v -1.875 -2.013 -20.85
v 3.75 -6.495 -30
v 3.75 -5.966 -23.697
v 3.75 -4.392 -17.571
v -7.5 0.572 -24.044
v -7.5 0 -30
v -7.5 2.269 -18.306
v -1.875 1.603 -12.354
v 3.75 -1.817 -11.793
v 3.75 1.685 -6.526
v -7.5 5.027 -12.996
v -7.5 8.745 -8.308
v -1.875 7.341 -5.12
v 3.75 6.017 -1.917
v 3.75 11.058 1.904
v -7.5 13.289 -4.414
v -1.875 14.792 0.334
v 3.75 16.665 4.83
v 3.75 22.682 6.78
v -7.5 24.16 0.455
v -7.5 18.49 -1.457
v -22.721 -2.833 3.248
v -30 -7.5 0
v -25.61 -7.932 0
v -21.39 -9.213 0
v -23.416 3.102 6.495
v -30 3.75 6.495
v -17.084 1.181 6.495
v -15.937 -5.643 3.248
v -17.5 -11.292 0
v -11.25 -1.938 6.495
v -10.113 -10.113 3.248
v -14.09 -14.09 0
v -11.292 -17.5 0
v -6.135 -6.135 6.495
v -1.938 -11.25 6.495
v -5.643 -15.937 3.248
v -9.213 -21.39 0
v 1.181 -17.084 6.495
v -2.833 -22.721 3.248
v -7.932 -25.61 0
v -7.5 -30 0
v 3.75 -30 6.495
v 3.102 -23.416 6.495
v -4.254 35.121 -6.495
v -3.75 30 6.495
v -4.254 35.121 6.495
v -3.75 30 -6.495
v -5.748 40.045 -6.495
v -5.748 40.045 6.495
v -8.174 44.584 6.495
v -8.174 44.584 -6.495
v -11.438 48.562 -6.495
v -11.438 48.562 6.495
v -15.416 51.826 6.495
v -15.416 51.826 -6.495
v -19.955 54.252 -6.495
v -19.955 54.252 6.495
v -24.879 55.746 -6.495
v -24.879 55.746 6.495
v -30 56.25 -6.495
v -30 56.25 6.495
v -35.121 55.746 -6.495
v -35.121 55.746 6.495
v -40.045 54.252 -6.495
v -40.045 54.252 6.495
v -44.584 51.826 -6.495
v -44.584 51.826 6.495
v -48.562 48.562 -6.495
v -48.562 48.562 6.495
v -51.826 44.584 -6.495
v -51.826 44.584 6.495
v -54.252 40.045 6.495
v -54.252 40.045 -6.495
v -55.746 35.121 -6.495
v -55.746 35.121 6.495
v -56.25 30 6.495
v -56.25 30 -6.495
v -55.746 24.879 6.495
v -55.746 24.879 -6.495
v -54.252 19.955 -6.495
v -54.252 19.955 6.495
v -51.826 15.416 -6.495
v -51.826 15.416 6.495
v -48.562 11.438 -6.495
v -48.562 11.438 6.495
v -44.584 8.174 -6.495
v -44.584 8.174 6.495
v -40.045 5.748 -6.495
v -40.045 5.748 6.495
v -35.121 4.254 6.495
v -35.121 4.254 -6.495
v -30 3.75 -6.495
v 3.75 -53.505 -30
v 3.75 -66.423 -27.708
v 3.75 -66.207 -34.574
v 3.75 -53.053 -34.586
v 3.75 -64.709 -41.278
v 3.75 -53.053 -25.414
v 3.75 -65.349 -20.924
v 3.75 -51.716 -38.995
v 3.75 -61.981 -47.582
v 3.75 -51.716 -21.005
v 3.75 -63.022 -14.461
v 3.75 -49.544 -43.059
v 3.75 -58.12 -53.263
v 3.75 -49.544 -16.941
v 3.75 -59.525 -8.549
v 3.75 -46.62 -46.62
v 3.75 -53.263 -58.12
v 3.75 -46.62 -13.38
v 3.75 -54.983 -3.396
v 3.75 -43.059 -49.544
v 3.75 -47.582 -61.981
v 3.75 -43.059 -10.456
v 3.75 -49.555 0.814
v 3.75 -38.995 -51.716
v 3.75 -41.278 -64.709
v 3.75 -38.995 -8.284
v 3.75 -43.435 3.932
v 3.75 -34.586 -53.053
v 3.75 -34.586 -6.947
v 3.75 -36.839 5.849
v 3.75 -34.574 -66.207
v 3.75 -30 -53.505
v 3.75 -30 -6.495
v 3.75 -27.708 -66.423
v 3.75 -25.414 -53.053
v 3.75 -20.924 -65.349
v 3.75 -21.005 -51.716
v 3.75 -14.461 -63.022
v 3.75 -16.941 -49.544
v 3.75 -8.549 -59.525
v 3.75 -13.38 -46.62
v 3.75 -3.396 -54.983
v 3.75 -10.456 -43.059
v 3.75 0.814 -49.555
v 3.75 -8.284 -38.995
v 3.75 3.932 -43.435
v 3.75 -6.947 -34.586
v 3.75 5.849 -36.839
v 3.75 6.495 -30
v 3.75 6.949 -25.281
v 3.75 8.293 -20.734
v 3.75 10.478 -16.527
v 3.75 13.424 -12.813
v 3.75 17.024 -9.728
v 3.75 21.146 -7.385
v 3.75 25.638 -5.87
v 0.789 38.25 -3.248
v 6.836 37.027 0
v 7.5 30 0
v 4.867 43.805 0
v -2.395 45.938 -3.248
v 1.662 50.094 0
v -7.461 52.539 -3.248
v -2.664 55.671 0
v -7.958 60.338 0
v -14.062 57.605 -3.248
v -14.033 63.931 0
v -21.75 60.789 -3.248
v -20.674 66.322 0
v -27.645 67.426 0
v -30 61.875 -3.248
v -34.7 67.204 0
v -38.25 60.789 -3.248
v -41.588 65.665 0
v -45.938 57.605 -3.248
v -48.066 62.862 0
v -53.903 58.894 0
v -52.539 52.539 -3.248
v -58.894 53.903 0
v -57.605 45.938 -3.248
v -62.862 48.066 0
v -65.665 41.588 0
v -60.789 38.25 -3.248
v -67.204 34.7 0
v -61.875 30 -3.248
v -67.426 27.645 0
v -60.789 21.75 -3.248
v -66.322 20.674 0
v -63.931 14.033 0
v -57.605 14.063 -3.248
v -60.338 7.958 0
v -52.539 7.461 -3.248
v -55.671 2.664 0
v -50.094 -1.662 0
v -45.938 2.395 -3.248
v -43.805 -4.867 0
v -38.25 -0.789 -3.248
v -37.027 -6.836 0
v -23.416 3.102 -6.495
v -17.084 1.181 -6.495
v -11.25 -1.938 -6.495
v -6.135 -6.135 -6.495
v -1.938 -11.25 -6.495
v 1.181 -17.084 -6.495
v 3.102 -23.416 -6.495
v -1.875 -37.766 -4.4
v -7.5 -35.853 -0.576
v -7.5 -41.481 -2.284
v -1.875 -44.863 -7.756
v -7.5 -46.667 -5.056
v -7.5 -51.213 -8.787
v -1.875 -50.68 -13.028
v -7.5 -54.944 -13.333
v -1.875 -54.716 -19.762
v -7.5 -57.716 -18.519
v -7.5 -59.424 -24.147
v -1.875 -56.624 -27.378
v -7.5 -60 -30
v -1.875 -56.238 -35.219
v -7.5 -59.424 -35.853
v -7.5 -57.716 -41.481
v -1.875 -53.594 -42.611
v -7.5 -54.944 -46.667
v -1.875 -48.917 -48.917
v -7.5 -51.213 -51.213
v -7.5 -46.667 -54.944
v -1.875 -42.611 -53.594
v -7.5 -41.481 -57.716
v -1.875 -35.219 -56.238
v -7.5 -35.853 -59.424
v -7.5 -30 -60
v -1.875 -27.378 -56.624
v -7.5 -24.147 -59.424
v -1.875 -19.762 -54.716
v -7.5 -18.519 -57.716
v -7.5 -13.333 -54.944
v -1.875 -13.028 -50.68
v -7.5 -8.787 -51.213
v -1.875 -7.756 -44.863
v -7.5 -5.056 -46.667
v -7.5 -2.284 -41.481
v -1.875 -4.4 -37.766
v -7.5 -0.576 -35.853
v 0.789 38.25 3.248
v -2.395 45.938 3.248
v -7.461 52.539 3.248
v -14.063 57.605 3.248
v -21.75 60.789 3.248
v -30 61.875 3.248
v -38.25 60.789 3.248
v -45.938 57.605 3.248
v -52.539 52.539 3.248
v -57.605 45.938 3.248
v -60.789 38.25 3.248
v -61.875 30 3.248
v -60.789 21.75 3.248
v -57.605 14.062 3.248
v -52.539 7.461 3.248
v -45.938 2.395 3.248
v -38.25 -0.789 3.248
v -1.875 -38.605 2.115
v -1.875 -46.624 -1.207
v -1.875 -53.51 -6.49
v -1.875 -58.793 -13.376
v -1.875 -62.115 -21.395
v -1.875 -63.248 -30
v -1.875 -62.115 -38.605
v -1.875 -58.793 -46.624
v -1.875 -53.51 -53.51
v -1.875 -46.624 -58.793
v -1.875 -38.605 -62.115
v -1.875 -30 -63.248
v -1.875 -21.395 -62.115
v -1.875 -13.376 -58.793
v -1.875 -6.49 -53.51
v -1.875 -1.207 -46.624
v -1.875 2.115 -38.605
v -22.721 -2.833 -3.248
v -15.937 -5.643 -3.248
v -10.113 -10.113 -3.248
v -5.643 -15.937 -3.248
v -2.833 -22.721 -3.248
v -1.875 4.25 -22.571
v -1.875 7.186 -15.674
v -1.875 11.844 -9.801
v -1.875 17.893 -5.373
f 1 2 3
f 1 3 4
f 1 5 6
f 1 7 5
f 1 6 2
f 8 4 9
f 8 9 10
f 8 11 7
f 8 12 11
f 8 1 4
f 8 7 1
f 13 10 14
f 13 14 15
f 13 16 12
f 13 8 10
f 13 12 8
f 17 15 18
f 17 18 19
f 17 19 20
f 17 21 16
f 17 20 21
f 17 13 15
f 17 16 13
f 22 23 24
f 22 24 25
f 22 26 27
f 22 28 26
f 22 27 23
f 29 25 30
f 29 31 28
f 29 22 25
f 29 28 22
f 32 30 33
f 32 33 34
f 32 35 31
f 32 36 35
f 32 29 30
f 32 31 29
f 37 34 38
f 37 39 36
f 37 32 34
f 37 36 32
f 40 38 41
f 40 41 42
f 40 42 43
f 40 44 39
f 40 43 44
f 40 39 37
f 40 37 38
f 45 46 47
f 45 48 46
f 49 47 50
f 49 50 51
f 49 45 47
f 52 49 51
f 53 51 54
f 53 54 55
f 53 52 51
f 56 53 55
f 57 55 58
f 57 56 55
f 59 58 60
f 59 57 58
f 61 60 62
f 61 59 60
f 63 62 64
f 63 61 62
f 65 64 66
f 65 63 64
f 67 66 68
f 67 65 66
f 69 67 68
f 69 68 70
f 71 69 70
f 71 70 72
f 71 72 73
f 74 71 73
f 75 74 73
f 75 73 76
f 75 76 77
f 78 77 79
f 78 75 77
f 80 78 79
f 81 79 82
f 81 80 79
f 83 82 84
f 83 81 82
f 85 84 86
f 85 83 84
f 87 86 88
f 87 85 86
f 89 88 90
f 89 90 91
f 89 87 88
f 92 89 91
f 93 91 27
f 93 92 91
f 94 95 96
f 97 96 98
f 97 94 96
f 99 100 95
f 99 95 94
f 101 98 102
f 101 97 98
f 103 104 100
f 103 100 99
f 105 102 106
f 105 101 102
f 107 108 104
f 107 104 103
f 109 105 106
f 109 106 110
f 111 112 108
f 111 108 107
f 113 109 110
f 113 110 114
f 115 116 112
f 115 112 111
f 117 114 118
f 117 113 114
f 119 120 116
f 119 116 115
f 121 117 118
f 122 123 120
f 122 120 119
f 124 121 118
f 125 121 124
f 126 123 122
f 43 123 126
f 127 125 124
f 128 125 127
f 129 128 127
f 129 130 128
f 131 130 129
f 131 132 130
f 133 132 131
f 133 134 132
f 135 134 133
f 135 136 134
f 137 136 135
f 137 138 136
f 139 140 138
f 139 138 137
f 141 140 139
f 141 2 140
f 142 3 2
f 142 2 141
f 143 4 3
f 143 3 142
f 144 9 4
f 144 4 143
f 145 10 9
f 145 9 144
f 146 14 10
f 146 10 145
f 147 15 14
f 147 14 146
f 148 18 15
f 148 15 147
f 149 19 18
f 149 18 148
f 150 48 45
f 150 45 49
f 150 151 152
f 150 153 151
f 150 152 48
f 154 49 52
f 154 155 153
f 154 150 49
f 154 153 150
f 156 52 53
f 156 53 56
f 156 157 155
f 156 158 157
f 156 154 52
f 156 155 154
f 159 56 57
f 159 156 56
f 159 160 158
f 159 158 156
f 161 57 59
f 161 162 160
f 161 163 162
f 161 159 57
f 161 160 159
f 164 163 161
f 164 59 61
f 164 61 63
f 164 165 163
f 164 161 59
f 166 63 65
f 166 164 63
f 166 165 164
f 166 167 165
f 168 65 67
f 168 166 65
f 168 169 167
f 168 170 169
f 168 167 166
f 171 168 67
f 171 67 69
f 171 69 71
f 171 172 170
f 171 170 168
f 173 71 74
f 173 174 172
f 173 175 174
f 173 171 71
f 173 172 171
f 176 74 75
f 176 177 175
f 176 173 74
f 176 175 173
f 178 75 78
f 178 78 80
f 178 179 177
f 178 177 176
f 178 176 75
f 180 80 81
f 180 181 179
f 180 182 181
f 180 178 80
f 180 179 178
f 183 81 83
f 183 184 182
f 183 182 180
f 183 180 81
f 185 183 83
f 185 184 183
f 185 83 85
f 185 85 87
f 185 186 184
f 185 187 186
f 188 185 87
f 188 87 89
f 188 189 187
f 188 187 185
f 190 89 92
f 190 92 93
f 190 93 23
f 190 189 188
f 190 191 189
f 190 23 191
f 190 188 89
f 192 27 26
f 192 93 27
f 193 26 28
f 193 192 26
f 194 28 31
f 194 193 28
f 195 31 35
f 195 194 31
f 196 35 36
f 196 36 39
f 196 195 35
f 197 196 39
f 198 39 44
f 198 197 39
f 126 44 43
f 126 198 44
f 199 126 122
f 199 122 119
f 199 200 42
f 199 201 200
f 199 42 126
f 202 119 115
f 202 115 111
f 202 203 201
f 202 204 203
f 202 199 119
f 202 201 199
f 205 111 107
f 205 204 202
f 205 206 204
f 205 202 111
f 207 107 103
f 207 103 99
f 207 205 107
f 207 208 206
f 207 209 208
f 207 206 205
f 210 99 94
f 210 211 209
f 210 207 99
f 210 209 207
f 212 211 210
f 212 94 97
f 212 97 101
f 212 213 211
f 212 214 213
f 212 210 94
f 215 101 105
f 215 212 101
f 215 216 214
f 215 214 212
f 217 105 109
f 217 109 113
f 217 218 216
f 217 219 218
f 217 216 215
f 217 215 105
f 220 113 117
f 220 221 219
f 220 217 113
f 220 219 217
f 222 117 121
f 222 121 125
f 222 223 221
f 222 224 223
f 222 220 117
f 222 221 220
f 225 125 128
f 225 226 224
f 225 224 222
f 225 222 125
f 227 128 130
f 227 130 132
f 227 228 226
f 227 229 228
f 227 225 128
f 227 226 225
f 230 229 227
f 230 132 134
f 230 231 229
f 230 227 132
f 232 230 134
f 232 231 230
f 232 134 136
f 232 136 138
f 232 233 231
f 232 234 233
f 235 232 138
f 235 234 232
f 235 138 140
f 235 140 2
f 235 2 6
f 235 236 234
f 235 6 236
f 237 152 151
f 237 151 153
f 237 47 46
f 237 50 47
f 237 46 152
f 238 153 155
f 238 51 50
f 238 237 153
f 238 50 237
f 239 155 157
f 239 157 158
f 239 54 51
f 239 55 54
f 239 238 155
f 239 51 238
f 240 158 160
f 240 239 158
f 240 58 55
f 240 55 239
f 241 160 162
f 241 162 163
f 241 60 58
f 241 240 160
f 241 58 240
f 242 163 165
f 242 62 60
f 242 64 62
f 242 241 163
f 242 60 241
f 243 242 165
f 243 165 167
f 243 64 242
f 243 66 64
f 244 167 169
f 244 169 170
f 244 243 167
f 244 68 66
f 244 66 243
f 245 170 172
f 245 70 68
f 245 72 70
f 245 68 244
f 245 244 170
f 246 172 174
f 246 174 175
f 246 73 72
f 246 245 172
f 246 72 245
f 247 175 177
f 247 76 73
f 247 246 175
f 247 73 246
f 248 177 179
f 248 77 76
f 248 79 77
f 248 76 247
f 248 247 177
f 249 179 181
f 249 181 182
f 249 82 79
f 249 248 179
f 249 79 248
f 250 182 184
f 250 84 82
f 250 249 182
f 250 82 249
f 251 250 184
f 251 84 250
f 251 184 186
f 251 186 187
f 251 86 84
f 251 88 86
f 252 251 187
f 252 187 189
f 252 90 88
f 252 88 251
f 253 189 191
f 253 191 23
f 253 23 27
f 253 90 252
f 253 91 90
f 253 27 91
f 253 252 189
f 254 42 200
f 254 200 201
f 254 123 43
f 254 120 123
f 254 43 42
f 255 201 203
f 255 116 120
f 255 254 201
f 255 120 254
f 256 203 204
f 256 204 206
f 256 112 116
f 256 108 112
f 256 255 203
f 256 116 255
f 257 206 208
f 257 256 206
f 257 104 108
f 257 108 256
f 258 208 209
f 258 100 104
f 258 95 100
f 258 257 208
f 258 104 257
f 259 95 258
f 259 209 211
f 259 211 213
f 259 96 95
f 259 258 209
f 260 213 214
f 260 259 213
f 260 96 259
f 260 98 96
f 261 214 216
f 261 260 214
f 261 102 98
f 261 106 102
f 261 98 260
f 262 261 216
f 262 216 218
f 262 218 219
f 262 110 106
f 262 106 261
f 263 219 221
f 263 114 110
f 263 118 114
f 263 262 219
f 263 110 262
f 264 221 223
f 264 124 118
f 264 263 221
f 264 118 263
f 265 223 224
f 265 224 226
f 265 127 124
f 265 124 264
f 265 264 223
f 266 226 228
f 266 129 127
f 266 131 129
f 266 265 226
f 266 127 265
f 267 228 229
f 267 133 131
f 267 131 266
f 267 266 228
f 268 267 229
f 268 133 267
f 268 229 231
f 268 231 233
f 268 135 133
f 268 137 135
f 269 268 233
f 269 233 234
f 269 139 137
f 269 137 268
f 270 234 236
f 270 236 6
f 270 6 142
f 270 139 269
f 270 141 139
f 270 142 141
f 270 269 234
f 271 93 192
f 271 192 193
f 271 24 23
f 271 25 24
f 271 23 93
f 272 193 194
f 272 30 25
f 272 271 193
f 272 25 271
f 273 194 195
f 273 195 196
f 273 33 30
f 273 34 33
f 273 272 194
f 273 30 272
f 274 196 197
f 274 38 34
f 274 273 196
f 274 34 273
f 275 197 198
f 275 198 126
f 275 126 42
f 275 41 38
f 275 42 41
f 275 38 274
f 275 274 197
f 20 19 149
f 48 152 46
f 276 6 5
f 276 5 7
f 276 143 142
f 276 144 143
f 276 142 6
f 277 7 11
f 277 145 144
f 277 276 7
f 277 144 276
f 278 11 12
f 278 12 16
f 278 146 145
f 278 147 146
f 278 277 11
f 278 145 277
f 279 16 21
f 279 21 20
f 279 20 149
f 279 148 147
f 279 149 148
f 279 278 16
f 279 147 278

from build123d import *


with BuildPart() as f4:
    # F4: sweep along a path in F0, F6
    with BuildLine(Plane.XY) as f4_path:
        ThreePointArc((0, 30), (-51.2132034356, 51.2132034356), (-30, 0))
        ThreePointArc((-30, 0), (-8.7867965644, -8.7867965644), (0, -30))
    with BuildLine(Plane(origin=(0, 0, 0), x_dir=(0, -1, 0), z_dir=(-1, 0, 0))) as f4_path_2:
        ThreePointArc((30, 0), (51.2132034356, -51.2132034356), (0, -30))
        ThreePointArc((0, -30), (-6.7735276417, -10.5626982962), (-24.16013062, 0.4552602768))
    # F5 (on offset) → F4 (sweep)
    with BuildSketch(Plane.XZ.offset(-30)):
        Polygon((-3.75, -6.4951905284), (7.5, 0), (-3.75, 6.4951905284), align=None)
    sweep(path=f4_path.line + f4_path_2.line)


solid = f4.part
